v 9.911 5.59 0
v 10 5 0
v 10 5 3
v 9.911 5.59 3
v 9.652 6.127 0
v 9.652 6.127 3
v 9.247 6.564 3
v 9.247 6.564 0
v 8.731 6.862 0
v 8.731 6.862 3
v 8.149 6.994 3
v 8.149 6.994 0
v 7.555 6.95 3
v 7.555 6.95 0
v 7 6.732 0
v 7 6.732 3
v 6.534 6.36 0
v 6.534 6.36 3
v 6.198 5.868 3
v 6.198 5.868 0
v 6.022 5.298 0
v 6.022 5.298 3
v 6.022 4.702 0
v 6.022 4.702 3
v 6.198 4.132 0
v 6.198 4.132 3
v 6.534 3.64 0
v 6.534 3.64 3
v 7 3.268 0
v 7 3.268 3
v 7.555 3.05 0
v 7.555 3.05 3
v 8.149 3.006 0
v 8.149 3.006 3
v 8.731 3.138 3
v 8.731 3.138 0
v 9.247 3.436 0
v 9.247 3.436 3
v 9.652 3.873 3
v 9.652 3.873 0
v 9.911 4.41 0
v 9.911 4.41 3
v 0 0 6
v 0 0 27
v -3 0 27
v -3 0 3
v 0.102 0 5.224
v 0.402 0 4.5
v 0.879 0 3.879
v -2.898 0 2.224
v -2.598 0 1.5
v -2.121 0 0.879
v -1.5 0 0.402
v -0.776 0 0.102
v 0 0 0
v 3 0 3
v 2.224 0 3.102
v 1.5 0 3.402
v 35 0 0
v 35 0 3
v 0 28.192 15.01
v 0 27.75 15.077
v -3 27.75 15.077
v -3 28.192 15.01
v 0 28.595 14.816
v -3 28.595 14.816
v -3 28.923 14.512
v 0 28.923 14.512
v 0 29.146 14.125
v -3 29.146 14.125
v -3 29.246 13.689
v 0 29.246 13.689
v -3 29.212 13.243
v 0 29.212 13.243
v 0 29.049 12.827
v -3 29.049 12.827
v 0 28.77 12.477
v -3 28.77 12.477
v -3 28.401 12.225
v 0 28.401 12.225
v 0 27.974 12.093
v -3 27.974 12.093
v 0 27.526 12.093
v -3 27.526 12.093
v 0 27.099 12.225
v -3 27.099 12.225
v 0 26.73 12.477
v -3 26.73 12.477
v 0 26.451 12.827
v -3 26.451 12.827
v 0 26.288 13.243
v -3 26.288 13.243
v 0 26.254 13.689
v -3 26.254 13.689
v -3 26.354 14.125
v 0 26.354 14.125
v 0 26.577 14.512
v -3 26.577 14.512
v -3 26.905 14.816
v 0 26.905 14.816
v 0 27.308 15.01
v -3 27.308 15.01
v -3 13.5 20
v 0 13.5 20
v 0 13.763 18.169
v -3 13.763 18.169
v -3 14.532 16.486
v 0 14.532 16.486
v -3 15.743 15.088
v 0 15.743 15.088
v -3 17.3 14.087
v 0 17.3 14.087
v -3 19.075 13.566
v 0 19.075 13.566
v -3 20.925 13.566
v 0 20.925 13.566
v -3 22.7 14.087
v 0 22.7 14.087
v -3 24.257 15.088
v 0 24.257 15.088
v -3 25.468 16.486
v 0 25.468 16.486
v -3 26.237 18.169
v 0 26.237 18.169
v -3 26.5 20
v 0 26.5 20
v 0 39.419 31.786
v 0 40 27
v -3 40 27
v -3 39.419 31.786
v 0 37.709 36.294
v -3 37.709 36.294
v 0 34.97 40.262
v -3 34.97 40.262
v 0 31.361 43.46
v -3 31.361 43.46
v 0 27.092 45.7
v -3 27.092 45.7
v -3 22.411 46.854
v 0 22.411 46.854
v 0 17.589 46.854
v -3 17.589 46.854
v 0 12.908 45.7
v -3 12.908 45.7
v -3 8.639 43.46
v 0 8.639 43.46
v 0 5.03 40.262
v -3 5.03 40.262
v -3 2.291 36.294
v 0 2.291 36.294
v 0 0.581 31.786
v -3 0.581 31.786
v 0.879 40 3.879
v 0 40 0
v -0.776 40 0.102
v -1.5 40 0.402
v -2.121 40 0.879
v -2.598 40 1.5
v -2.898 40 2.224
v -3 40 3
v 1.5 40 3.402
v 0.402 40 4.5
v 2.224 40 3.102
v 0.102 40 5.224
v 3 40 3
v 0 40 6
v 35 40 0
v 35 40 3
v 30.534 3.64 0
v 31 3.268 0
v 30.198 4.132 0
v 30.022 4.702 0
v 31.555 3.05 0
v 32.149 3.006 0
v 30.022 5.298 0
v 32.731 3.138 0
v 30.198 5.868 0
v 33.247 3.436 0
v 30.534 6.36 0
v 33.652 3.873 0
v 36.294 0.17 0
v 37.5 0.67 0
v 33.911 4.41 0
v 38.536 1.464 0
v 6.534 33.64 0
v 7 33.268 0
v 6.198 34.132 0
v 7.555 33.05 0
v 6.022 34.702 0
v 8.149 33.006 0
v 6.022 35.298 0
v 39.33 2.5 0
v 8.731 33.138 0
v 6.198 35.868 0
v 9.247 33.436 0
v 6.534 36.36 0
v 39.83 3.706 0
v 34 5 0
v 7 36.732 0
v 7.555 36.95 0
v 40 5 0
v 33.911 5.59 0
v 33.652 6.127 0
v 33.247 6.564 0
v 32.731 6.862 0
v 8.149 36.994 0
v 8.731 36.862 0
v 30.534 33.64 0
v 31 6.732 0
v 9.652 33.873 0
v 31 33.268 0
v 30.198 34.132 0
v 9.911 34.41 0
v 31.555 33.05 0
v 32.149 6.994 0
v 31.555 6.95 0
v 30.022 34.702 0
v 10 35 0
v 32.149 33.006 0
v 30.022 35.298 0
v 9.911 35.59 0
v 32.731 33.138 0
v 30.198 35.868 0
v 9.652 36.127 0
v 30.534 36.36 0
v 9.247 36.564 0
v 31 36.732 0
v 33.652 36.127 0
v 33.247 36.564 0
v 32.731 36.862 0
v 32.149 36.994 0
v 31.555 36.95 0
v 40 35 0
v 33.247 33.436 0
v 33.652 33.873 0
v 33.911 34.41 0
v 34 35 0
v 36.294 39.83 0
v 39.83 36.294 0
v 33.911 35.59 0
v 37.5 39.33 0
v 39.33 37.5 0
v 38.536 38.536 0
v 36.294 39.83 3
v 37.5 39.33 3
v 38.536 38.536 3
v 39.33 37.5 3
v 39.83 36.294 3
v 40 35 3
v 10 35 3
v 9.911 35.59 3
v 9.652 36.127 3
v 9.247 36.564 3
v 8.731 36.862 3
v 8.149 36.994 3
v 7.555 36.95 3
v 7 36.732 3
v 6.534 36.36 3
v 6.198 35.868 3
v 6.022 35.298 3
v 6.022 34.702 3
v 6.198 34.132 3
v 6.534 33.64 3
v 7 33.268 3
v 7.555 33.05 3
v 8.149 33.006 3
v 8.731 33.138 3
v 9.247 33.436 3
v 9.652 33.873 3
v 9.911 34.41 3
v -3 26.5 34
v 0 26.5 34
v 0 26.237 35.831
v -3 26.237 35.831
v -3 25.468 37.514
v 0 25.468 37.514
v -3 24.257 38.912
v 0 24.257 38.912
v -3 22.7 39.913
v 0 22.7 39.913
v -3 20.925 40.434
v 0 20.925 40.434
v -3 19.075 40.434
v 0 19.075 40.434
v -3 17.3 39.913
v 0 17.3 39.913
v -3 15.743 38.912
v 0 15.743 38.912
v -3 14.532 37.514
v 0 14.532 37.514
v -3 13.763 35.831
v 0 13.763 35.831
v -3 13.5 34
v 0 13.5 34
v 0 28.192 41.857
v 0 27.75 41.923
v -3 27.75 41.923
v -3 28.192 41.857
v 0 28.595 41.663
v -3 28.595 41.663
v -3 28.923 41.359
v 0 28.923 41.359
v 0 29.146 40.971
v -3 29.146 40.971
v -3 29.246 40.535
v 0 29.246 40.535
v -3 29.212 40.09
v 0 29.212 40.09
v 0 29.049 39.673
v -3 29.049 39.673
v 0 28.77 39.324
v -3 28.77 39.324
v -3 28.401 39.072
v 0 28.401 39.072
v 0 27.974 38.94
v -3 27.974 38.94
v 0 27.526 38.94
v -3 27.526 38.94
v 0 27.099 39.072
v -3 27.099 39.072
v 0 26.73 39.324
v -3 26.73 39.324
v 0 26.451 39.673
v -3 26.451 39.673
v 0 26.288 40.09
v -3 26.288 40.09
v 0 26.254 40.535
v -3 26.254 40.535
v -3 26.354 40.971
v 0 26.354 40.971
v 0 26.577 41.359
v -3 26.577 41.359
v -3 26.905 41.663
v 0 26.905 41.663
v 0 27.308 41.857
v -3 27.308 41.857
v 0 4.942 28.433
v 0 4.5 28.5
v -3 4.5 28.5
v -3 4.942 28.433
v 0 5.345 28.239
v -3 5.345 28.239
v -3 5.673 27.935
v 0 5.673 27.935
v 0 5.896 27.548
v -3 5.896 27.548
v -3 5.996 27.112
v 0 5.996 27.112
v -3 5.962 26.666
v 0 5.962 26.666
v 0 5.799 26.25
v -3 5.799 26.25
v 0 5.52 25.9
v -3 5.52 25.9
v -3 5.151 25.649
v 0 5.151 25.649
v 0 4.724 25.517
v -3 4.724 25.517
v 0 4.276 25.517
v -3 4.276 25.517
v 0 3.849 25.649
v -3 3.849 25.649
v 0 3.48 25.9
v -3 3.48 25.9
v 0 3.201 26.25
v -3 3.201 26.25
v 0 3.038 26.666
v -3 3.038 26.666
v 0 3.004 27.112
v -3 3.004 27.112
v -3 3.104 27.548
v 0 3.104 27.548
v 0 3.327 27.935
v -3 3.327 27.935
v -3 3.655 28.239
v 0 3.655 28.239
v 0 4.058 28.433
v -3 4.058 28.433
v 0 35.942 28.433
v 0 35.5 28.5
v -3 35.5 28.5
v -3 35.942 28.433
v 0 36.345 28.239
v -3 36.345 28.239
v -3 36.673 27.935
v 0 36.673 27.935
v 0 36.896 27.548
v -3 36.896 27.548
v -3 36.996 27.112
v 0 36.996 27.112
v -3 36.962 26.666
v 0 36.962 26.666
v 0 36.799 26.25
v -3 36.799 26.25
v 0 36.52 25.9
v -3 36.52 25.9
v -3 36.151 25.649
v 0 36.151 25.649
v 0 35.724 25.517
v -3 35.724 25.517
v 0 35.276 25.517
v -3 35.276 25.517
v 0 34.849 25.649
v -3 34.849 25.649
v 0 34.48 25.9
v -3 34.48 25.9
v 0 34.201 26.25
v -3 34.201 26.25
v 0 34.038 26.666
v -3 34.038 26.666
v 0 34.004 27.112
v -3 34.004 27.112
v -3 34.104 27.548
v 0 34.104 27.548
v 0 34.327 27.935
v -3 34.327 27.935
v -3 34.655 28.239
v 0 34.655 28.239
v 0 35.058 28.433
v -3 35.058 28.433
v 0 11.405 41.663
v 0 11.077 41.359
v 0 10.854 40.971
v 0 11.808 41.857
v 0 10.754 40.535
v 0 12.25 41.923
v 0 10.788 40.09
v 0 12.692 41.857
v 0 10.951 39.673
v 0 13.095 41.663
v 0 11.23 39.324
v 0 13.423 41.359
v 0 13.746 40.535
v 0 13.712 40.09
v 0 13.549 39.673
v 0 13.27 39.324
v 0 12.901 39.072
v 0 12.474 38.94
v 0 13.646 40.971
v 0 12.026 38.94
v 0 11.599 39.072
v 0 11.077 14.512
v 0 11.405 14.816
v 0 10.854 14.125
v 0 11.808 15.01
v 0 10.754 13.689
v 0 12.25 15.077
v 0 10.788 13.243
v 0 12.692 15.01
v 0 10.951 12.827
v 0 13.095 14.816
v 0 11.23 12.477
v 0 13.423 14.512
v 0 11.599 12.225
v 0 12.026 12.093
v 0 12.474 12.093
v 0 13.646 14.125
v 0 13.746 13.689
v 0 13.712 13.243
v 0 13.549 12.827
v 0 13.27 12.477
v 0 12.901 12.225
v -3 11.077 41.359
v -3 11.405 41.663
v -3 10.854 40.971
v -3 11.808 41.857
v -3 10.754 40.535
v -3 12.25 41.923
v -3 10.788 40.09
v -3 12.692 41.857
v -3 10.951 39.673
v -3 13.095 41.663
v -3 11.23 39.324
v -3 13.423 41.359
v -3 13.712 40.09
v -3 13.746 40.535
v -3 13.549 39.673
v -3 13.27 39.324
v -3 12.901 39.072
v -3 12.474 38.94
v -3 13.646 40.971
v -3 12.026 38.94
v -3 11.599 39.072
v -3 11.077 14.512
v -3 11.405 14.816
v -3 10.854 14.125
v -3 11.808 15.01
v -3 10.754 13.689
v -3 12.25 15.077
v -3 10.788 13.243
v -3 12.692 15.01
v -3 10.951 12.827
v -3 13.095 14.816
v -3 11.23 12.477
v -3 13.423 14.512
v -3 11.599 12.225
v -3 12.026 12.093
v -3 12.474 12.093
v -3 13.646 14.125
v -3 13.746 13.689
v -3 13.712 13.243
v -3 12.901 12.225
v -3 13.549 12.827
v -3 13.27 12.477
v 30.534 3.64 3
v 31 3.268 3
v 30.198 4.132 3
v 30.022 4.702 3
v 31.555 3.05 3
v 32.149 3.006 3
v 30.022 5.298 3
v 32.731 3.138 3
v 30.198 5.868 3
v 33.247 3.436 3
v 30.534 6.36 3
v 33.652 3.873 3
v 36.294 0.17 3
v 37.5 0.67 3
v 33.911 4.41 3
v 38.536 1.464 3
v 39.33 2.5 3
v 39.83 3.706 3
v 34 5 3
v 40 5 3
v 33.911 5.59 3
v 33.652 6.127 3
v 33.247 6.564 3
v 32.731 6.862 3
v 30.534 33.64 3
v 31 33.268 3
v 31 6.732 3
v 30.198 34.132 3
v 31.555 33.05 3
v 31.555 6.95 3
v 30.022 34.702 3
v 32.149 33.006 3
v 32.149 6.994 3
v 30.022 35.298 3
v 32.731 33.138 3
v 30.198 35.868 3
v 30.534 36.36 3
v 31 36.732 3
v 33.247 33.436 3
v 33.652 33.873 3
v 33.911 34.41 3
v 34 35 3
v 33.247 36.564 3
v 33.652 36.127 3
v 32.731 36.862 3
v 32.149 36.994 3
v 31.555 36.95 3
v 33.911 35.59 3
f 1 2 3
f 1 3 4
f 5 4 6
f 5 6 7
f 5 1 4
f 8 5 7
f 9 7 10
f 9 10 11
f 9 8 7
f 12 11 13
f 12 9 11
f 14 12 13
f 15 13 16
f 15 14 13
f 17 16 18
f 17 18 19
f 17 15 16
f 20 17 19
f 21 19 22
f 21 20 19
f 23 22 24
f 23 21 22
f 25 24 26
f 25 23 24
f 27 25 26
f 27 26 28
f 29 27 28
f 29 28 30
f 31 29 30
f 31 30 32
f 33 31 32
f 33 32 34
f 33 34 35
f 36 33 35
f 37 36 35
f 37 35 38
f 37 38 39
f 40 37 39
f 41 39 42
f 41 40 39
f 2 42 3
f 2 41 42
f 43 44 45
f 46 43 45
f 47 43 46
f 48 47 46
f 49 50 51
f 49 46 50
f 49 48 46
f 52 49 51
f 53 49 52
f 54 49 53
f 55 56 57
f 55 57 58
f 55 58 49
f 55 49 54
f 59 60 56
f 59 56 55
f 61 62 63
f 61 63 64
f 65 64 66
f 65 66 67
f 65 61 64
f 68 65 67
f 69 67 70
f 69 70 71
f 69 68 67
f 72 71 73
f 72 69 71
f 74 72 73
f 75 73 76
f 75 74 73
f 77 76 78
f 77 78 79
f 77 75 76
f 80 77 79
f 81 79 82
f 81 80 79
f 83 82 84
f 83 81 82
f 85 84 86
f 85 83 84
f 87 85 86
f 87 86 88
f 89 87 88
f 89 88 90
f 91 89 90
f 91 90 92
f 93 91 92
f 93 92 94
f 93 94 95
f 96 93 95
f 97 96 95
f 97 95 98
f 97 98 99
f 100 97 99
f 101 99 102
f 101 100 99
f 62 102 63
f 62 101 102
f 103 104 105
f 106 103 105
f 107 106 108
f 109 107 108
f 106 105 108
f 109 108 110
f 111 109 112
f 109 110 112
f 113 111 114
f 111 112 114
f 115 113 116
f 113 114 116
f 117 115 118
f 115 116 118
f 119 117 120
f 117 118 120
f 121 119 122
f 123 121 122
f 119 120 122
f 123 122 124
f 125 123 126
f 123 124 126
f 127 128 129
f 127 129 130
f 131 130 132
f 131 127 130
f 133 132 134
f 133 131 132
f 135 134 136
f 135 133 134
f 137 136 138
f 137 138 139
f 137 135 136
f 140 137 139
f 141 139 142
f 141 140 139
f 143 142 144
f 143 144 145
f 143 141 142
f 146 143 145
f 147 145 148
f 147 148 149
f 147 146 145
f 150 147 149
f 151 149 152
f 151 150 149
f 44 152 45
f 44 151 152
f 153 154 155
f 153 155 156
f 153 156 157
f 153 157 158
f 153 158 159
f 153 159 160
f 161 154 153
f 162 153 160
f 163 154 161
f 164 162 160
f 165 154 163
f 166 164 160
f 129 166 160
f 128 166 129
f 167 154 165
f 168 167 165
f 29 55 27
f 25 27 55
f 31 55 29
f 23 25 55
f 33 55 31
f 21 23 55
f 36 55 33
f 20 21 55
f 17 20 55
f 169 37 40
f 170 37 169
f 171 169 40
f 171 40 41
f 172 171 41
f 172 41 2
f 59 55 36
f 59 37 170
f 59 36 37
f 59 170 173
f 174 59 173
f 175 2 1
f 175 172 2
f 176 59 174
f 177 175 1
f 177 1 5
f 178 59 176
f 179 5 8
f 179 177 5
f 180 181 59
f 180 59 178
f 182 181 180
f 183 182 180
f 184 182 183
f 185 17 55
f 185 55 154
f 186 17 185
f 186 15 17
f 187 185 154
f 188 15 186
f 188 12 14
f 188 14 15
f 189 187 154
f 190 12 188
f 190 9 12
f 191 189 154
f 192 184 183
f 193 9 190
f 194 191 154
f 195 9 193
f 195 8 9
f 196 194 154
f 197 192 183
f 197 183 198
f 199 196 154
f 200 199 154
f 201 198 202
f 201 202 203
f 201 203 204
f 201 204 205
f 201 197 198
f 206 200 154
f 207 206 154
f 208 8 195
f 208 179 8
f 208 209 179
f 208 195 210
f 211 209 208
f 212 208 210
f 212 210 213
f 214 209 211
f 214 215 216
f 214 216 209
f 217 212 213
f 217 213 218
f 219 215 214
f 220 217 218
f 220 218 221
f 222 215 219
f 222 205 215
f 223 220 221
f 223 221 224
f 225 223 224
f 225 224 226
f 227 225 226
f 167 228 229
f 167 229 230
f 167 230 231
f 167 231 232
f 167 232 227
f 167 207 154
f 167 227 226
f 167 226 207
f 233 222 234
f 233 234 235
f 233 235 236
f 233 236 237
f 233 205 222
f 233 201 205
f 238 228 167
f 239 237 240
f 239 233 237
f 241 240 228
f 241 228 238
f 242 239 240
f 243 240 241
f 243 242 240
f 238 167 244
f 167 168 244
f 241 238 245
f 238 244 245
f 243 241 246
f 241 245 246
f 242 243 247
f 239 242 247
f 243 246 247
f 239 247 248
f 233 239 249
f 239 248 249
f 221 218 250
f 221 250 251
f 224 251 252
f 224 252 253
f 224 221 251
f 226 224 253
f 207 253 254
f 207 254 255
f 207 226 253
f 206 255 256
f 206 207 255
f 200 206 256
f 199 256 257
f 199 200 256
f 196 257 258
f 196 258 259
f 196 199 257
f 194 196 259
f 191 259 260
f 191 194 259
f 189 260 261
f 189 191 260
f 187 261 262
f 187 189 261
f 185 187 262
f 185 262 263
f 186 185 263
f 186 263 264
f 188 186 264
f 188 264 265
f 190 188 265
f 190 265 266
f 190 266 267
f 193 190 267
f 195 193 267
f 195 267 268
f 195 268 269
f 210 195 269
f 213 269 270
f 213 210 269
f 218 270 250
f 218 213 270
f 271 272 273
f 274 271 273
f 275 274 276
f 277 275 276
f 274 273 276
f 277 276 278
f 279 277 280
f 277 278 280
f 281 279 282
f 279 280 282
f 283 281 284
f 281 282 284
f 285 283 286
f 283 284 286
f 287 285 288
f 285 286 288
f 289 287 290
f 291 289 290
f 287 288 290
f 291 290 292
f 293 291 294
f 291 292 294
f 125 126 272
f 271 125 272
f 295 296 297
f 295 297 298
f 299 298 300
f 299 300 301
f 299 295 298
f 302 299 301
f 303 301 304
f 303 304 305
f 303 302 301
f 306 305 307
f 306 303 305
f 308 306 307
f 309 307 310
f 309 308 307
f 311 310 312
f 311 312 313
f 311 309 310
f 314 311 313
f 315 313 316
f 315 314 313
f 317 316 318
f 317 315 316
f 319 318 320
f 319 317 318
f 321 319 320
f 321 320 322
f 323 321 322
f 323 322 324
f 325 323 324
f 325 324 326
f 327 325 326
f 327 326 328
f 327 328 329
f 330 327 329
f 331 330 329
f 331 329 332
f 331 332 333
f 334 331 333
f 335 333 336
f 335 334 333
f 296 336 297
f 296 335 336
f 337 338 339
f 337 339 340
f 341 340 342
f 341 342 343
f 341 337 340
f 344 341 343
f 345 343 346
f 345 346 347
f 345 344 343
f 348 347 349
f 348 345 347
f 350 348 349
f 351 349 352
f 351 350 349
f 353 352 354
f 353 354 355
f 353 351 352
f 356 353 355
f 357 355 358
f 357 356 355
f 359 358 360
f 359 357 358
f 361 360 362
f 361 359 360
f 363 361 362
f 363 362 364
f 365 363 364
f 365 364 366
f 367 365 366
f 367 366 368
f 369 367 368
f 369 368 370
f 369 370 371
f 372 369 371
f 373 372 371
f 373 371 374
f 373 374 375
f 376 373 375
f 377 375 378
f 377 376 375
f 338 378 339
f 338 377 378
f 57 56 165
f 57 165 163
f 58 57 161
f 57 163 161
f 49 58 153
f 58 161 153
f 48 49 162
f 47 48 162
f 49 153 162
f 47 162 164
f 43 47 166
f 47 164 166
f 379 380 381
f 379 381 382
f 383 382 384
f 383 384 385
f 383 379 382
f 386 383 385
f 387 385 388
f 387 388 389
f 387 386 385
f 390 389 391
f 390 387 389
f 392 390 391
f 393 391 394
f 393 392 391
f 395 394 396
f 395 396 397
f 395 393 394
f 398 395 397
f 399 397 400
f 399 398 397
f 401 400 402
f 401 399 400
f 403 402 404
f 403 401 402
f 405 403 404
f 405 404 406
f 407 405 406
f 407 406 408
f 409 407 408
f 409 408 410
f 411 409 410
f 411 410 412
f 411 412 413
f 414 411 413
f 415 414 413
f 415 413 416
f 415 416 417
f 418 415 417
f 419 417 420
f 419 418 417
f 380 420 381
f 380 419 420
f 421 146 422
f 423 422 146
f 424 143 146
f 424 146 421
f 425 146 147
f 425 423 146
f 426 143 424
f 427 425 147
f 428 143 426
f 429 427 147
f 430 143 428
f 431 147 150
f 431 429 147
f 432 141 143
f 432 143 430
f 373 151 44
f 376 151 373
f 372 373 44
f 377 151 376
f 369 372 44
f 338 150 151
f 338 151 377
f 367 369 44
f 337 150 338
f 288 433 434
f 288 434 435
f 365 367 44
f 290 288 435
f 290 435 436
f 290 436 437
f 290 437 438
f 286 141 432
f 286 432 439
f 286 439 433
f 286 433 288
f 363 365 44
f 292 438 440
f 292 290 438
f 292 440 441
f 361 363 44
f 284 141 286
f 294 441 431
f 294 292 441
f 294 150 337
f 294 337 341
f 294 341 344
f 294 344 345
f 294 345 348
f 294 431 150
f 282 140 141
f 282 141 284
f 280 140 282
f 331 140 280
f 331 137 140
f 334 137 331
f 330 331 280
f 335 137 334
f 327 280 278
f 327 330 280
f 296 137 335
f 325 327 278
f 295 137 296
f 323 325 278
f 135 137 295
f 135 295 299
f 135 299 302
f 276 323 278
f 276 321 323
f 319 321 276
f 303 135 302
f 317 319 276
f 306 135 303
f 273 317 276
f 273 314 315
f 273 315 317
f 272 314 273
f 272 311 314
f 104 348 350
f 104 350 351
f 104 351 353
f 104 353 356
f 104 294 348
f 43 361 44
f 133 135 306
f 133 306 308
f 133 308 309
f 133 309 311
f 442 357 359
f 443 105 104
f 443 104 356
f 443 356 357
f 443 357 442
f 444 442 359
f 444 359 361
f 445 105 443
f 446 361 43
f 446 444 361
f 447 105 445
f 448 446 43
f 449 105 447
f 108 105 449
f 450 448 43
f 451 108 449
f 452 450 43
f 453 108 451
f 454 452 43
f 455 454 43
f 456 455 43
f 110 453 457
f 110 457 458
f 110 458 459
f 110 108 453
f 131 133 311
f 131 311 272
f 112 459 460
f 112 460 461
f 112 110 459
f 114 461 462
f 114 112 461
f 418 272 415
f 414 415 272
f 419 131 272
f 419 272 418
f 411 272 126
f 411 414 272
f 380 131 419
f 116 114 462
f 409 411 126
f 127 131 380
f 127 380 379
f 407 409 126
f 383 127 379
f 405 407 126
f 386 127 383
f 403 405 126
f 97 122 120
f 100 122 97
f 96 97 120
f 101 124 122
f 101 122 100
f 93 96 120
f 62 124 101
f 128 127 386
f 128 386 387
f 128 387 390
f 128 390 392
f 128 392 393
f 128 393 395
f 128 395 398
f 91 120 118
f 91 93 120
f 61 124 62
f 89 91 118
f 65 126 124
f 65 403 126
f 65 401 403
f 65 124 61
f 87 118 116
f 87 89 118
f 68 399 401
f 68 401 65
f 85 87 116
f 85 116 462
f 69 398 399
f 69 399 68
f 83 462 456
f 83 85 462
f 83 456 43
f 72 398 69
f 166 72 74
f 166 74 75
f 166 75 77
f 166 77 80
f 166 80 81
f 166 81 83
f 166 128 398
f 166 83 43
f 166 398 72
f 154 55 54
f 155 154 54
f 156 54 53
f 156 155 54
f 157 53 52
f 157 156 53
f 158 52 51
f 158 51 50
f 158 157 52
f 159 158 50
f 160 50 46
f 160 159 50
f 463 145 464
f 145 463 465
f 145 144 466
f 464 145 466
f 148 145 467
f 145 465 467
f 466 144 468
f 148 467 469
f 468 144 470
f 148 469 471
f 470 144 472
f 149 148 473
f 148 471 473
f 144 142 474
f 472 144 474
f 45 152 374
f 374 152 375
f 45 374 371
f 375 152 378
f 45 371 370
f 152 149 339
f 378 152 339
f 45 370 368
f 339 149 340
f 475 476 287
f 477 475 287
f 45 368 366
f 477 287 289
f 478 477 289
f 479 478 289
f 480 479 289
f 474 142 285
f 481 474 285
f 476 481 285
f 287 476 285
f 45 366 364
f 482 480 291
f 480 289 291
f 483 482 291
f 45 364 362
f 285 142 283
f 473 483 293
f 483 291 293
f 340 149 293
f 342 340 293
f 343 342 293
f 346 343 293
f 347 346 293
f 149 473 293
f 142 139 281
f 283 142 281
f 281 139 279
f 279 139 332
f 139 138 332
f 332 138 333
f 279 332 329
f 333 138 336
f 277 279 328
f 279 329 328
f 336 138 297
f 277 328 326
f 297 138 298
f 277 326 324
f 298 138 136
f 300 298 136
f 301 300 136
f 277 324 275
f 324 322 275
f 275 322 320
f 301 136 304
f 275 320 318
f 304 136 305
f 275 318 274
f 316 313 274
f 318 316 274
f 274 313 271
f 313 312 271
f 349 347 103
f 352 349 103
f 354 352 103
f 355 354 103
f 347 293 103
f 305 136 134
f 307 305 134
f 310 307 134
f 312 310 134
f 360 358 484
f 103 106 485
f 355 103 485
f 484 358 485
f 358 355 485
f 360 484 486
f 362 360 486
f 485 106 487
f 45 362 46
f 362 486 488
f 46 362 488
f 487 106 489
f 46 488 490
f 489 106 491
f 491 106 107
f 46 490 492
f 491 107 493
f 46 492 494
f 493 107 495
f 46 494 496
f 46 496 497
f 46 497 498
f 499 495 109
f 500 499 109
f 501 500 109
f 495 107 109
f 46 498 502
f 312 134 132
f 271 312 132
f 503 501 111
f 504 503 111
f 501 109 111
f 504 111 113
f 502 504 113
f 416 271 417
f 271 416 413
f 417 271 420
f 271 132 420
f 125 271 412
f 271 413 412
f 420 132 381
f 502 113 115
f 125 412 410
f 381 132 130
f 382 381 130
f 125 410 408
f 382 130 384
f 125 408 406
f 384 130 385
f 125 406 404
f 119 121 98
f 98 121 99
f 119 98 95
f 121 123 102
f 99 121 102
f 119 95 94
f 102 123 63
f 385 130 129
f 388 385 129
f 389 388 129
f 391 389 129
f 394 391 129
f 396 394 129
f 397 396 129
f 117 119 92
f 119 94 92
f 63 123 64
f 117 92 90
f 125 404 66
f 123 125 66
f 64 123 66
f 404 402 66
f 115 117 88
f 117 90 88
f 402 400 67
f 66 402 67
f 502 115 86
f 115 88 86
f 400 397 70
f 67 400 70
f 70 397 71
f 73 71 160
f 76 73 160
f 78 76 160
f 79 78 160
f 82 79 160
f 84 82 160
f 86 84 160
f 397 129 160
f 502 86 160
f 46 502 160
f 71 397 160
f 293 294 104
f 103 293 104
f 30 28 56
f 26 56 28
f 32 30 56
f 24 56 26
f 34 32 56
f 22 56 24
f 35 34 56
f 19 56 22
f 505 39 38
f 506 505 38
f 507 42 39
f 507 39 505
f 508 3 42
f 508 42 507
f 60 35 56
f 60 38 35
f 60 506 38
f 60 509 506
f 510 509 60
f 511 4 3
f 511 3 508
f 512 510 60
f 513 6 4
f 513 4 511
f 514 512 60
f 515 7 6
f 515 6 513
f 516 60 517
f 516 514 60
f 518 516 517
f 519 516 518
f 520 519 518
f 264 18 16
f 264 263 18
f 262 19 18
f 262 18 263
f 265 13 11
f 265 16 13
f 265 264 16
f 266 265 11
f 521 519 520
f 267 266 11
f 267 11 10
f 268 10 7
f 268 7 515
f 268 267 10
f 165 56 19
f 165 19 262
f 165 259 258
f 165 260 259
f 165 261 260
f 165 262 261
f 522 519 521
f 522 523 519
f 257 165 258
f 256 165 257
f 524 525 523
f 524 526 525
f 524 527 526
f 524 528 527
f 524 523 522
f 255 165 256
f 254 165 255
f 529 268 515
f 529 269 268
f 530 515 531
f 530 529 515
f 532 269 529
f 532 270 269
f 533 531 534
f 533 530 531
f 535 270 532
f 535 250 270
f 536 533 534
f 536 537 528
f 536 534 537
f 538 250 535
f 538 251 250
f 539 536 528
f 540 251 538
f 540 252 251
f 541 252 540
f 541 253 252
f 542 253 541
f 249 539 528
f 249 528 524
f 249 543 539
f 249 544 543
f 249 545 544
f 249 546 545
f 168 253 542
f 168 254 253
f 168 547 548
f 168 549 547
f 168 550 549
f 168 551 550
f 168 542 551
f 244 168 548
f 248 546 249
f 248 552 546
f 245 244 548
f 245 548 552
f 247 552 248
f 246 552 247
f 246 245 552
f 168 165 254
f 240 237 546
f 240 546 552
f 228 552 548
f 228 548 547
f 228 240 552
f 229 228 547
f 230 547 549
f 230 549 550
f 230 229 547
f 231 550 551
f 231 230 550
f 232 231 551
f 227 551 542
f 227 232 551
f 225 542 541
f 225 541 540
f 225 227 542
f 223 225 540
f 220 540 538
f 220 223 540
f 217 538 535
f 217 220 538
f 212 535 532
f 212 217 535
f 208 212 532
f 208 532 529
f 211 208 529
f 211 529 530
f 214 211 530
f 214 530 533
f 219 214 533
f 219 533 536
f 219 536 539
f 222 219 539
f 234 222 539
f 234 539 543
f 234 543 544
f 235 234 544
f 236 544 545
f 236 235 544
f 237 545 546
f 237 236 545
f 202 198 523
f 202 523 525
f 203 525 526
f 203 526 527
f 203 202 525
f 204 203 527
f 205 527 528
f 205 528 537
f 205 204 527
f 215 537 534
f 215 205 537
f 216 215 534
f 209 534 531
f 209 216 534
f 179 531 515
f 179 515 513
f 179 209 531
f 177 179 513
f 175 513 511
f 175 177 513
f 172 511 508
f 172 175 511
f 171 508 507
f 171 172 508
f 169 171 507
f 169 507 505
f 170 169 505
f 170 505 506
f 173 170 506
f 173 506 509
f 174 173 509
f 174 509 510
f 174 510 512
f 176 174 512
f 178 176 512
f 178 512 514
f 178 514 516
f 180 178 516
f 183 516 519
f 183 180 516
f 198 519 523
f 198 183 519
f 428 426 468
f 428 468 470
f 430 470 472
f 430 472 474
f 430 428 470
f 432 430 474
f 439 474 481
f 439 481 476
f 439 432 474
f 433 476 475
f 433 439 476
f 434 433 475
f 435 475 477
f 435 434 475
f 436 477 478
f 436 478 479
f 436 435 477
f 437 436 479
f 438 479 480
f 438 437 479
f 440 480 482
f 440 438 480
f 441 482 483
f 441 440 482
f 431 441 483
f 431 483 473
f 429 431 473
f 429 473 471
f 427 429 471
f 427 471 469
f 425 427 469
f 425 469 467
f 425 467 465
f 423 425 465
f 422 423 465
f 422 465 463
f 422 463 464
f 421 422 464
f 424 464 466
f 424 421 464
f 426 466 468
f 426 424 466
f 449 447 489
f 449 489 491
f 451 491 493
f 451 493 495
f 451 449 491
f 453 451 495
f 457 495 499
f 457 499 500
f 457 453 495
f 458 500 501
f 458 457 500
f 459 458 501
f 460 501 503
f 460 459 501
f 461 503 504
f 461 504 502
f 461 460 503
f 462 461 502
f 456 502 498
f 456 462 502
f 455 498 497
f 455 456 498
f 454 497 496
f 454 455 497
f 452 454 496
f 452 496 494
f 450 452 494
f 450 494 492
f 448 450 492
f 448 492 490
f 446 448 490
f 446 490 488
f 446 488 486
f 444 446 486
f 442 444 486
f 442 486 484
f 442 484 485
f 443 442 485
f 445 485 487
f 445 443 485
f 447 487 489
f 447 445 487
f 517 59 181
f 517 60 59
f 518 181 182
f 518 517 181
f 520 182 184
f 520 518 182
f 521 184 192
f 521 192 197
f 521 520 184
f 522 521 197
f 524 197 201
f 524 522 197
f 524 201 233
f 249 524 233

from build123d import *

# Parameters (mm, degrees)
SKETCH_1_W      = 40
SKETCH_1_H      = 40
SKETCH_1_R      = 2
EXTRUDE_1_DEPTH = 3
FILLET_1_R      = 5
SKETCH_2_R      = 1.5
EXTRUDE_2_DEPTH = 3
FILLET_2_R      = 3


with BuildPart() as part:
    # 草图1 → 凸台-拉伸1 (new body)
    with BuildSketch(Plane.XY):
        with Locations((20, 20)):
            Rectangle(SKETCH_1_W, SKETCH_1_H)
        with Locations((8, 35)):
            Circle(SKETCH_1_R, mode=Mode.SUBTRACT)
        with Locations((32, 35)):
            Circle(SKETCH_1_R, mode=Mode.SUBTRACT)
        with Locations((32, 5)):
            Circle(SKETCH_1_R, mode=Mode.SUBTRACT)
        with Locations((8, 5)):
            Circle(SKETCH_1_R, mode=Mode.SUBTRACT)
    extrude(amount=EXTRUDE_1_DEPTH)

    # 圆角1
    fillet_1_edges = [part.edges().sort_by_distance(p)[0] for p in [
        (40, 40, 1.5),
        (40, 0, 1.5),
    ]]
    fillet(fillet_1_edges, radius=FILLET_1_R)

    # 草图2 → 凸台-拉伸2 (add)
    with BuildSketch(Plane.ZY):
        with BuildLine():
            Line((0, 40), (27, 40))
            ThreePointArc((27, 40), (47, 20), (27, 0))
            Line((27, 0), (0, 0))
            Line((0, 0), (0, 40))
        make_face()
        with Locations((27, 35.5)):
            Circle(SKETCH_2_R, mode=Mode.SUBTRACT)
        with Locations((40.423393759, 27.75)):
            Circle(SKETCH_2_R, mode=Mode.SUBTRACT)
        with Locations((40.423393759, 12.25)):
            Circle(SKETCH_2_R, mode=Mode.SUBTRACT)
        with Locations((27, 4.5)):
            Circle(SKETCH_2_R, mode=Mode.SUBTRACT)
        with Locations((13.576606241, 12.25)):
            Circle(SKETCH_2_R, mode=Mode.SUBTRACT)
        with Locations((13.576606241, 27.75)):
            Circle(SKETCH_2_R, mode=Mode.SUBTRACT)
        with BuildLine():
            Line((20, 26.5), (34, 26.5))
            ThreePointArc((34, 26.5), (40.5, 20), (34, 13.5))
            Line((34, 13.5), (20, 13.5))
            ThreePointArc((20, 13.5), (13.5, 20), (20, 26.5))
        make_face(mode=Mode.SUBTRACT)
    extrude(amount=EXTRUDE_2_DEPTH)

    # 圆角2
    fillet_2_edges = [part.edges().sort_by_distance(p)[0] for p in [
        (-3, 20, 0),
        (0, 20, 3),
    ]]
    fillet(fillet_2_edges, radius=FILLET_2_R)


solid = part.part
